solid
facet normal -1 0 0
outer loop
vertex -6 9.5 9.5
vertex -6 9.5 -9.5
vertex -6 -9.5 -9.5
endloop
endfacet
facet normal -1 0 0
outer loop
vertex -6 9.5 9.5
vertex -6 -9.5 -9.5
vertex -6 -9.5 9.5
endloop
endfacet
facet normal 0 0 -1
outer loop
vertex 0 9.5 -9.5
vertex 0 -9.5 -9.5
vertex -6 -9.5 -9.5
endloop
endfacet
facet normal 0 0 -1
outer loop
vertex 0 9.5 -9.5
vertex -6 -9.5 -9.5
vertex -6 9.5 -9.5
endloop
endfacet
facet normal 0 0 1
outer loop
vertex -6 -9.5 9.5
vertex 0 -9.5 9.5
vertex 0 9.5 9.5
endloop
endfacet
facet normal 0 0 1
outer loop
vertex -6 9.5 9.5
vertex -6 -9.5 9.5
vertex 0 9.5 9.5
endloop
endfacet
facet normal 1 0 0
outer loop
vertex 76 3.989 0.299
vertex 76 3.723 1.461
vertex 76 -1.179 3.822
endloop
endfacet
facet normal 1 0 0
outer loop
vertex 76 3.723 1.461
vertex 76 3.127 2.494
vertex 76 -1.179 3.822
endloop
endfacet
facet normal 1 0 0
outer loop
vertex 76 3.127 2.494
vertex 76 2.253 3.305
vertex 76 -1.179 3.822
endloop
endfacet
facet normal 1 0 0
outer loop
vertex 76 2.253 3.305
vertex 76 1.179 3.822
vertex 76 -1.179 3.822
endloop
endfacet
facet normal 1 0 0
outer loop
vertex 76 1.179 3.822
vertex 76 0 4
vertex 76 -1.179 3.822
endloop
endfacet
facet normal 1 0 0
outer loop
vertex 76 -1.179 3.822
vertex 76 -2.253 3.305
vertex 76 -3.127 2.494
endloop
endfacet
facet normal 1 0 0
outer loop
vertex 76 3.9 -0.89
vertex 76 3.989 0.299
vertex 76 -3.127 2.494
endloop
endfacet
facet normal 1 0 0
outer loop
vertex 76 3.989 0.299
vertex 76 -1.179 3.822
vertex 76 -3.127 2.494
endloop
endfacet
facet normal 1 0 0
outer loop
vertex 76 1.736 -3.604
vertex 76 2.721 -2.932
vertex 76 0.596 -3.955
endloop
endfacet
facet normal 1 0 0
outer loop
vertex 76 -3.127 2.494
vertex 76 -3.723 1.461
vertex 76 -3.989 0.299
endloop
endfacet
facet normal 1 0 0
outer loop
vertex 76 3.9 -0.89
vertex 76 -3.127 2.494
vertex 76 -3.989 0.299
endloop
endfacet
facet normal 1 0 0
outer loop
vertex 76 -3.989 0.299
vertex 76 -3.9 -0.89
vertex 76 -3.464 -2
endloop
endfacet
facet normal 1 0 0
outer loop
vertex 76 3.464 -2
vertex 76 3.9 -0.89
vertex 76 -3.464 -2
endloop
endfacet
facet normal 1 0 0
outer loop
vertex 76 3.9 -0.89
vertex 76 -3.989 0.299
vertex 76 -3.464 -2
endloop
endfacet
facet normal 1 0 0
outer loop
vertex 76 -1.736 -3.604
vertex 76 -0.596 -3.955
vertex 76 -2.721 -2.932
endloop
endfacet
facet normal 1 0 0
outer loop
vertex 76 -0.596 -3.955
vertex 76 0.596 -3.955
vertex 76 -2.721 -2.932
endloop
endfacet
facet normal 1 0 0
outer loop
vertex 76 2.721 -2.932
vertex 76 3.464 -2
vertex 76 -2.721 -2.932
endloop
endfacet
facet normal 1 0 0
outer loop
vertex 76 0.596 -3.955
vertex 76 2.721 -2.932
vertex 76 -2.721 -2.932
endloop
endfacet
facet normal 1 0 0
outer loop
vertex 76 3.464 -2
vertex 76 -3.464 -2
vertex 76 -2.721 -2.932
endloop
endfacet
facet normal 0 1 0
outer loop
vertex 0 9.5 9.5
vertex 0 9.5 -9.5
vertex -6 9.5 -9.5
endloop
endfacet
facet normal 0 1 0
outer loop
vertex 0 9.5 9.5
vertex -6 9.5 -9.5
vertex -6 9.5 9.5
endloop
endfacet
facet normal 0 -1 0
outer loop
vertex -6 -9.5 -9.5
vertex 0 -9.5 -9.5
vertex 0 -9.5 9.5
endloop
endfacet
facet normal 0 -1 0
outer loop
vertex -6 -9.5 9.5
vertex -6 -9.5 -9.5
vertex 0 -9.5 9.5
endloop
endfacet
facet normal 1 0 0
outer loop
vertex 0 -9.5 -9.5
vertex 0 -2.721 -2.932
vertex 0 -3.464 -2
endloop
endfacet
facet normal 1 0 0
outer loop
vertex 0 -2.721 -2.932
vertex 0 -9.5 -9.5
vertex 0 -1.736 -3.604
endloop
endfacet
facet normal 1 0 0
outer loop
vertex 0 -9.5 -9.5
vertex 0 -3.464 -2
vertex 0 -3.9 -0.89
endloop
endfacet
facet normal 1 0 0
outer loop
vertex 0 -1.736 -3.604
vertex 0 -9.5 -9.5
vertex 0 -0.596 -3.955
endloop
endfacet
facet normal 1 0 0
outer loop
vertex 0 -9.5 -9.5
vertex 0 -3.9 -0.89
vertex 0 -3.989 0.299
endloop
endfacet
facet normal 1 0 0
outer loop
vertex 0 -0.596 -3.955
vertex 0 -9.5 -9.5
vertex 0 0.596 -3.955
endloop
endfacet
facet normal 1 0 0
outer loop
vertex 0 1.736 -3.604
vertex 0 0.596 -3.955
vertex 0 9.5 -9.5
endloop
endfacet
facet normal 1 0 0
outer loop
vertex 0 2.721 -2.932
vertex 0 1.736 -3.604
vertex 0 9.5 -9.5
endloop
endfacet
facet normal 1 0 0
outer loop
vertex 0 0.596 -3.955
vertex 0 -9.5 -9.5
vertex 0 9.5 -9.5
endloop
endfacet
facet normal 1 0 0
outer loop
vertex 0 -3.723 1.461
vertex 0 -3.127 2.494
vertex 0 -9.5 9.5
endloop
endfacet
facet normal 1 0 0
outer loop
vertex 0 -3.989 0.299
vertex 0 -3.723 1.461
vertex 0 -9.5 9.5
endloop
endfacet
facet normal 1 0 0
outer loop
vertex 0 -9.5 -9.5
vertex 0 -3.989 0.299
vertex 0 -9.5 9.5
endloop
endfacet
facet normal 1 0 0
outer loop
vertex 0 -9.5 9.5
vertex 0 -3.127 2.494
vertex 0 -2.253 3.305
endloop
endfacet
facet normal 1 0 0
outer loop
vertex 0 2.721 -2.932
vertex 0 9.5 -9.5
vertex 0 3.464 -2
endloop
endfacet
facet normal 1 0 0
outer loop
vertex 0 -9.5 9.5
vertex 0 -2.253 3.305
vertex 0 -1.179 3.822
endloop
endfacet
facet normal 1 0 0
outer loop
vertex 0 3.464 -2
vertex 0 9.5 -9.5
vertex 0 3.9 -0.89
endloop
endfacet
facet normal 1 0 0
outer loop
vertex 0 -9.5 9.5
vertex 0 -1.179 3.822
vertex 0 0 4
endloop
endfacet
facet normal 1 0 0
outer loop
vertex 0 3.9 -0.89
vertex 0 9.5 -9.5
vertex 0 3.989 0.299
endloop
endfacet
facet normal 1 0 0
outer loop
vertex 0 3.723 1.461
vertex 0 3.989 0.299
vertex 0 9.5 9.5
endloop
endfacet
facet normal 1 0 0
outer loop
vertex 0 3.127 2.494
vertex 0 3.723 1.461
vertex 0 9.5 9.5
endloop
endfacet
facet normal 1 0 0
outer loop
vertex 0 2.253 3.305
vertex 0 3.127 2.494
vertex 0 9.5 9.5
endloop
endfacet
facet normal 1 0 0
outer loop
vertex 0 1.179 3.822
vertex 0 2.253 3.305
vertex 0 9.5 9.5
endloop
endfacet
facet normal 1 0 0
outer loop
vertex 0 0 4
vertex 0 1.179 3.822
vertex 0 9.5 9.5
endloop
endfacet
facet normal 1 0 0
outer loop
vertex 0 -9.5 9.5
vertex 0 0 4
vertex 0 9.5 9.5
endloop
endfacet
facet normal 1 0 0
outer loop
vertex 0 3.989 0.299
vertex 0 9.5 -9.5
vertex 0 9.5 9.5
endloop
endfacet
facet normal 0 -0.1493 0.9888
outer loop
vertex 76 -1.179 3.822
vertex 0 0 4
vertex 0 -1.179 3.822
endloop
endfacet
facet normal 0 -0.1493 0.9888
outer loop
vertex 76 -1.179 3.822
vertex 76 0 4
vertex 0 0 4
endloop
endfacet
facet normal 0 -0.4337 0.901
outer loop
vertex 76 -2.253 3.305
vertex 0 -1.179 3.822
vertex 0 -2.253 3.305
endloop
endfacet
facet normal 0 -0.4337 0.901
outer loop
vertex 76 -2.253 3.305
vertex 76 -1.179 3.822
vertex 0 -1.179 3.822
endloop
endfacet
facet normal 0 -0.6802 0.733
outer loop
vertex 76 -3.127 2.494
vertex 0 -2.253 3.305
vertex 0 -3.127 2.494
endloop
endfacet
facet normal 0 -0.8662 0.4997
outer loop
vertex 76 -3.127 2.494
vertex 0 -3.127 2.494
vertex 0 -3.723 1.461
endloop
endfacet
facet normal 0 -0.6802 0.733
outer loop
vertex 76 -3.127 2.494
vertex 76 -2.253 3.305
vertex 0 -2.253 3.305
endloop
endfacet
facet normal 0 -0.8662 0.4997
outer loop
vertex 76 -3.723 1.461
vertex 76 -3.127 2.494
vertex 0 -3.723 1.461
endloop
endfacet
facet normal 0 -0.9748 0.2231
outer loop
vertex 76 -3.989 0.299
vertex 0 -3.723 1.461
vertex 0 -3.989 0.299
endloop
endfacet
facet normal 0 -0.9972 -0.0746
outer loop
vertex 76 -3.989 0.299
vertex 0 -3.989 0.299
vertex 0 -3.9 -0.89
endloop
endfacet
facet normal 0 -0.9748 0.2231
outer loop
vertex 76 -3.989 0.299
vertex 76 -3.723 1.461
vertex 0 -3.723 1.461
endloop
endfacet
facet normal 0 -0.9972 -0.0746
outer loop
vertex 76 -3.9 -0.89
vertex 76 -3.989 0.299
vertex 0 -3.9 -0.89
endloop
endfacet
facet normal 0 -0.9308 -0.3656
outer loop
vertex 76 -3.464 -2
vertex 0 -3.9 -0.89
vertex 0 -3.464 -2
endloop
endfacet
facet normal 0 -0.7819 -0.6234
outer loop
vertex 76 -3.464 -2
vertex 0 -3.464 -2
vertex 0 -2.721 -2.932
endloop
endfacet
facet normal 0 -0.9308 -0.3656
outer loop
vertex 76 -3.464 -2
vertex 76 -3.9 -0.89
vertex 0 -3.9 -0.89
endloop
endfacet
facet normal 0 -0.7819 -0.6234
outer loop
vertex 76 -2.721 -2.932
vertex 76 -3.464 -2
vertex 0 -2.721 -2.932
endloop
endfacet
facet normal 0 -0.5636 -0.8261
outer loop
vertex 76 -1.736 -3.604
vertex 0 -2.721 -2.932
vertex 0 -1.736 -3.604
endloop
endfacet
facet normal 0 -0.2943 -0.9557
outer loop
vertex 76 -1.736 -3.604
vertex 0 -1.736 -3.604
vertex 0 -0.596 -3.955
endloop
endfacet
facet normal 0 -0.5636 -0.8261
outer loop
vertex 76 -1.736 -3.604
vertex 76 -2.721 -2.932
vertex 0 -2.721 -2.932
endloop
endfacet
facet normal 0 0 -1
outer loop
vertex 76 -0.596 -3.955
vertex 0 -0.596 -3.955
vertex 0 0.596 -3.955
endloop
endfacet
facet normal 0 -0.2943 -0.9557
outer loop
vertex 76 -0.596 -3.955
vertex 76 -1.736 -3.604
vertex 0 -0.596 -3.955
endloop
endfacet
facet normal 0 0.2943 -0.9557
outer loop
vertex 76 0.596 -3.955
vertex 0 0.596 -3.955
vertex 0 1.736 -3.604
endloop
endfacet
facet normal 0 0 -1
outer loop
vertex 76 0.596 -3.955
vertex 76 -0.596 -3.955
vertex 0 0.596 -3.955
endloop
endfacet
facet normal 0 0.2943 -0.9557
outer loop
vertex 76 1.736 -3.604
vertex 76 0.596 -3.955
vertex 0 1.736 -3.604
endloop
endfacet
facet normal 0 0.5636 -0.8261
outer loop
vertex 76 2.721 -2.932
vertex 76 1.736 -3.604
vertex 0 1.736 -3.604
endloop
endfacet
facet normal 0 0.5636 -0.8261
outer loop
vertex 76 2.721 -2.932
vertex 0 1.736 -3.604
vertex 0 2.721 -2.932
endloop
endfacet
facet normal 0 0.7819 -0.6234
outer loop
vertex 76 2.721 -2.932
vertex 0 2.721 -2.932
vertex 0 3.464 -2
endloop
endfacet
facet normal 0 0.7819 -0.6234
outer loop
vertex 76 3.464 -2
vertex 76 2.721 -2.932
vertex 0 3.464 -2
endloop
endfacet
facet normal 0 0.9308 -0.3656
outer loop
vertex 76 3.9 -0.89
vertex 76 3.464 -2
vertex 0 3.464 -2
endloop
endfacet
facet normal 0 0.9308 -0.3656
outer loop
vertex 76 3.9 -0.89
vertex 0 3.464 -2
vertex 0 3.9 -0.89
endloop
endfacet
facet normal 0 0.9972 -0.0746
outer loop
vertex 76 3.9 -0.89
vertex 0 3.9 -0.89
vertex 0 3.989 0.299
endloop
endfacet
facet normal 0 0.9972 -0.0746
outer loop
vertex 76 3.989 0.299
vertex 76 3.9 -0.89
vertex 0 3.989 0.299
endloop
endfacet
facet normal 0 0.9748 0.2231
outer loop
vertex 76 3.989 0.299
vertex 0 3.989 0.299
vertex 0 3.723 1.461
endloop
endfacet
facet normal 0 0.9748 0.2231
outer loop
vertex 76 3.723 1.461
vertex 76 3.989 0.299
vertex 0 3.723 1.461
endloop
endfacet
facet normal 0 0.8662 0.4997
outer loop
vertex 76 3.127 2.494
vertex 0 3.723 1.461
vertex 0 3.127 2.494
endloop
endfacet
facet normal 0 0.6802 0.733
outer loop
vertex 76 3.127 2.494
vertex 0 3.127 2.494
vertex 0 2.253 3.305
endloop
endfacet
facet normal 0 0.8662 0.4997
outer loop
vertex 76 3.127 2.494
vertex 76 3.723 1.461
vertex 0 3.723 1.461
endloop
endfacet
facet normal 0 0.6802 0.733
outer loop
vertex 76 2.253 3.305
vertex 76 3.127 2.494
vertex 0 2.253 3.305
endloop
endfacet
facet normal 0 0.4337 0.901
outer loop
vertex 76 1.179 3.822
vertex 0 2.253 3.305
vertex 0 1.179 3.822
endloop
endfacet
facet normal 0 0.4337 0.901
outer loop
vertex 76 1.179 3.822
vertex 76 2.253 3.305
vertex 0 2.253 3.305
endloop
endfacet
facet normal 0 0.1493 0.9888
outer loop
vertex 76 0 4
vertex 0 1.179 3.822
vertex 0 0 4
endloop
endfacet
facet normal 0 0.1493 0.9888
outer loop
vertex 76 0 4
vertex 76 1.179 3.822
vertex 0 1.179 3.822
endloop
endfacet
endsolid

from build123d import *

# Parameters (mm, degrees)
SKETCH1_W           = 76
SKETCH1_H           = 4
SKETCH2_W           = 19
SKETCH2_H           = 19
BOSS_EXTRUDE1_DEPTH = 6


with BuildPart() as part:
    # Sketch1 → Revolve1 (revolve)
    with BuildSketch(Plane.XY, mode=Mode.PRIVATE) as revolve1_sk:
        with Locations((38, 2)):
            Rectangle(SKETCH1_W, SKETCH1_H)
    revolve(revolve1_sk.sketch.rotate(Axis((0, 0, 0), (1, 0, 0)), 90), axis=Axis((0, 0, 0), (1, 0, 0)))  # turned: the seam where the file's is

    # Sketch2 → Boss-Extrude1 (add)
    with BuildSketch(Plane.ZY):
        Rectangle(SKETCH2_W, SKETCH2_H)
    extrude(amount=BOSS_EXTRUDE1_DEPTH)


solid = part.part
